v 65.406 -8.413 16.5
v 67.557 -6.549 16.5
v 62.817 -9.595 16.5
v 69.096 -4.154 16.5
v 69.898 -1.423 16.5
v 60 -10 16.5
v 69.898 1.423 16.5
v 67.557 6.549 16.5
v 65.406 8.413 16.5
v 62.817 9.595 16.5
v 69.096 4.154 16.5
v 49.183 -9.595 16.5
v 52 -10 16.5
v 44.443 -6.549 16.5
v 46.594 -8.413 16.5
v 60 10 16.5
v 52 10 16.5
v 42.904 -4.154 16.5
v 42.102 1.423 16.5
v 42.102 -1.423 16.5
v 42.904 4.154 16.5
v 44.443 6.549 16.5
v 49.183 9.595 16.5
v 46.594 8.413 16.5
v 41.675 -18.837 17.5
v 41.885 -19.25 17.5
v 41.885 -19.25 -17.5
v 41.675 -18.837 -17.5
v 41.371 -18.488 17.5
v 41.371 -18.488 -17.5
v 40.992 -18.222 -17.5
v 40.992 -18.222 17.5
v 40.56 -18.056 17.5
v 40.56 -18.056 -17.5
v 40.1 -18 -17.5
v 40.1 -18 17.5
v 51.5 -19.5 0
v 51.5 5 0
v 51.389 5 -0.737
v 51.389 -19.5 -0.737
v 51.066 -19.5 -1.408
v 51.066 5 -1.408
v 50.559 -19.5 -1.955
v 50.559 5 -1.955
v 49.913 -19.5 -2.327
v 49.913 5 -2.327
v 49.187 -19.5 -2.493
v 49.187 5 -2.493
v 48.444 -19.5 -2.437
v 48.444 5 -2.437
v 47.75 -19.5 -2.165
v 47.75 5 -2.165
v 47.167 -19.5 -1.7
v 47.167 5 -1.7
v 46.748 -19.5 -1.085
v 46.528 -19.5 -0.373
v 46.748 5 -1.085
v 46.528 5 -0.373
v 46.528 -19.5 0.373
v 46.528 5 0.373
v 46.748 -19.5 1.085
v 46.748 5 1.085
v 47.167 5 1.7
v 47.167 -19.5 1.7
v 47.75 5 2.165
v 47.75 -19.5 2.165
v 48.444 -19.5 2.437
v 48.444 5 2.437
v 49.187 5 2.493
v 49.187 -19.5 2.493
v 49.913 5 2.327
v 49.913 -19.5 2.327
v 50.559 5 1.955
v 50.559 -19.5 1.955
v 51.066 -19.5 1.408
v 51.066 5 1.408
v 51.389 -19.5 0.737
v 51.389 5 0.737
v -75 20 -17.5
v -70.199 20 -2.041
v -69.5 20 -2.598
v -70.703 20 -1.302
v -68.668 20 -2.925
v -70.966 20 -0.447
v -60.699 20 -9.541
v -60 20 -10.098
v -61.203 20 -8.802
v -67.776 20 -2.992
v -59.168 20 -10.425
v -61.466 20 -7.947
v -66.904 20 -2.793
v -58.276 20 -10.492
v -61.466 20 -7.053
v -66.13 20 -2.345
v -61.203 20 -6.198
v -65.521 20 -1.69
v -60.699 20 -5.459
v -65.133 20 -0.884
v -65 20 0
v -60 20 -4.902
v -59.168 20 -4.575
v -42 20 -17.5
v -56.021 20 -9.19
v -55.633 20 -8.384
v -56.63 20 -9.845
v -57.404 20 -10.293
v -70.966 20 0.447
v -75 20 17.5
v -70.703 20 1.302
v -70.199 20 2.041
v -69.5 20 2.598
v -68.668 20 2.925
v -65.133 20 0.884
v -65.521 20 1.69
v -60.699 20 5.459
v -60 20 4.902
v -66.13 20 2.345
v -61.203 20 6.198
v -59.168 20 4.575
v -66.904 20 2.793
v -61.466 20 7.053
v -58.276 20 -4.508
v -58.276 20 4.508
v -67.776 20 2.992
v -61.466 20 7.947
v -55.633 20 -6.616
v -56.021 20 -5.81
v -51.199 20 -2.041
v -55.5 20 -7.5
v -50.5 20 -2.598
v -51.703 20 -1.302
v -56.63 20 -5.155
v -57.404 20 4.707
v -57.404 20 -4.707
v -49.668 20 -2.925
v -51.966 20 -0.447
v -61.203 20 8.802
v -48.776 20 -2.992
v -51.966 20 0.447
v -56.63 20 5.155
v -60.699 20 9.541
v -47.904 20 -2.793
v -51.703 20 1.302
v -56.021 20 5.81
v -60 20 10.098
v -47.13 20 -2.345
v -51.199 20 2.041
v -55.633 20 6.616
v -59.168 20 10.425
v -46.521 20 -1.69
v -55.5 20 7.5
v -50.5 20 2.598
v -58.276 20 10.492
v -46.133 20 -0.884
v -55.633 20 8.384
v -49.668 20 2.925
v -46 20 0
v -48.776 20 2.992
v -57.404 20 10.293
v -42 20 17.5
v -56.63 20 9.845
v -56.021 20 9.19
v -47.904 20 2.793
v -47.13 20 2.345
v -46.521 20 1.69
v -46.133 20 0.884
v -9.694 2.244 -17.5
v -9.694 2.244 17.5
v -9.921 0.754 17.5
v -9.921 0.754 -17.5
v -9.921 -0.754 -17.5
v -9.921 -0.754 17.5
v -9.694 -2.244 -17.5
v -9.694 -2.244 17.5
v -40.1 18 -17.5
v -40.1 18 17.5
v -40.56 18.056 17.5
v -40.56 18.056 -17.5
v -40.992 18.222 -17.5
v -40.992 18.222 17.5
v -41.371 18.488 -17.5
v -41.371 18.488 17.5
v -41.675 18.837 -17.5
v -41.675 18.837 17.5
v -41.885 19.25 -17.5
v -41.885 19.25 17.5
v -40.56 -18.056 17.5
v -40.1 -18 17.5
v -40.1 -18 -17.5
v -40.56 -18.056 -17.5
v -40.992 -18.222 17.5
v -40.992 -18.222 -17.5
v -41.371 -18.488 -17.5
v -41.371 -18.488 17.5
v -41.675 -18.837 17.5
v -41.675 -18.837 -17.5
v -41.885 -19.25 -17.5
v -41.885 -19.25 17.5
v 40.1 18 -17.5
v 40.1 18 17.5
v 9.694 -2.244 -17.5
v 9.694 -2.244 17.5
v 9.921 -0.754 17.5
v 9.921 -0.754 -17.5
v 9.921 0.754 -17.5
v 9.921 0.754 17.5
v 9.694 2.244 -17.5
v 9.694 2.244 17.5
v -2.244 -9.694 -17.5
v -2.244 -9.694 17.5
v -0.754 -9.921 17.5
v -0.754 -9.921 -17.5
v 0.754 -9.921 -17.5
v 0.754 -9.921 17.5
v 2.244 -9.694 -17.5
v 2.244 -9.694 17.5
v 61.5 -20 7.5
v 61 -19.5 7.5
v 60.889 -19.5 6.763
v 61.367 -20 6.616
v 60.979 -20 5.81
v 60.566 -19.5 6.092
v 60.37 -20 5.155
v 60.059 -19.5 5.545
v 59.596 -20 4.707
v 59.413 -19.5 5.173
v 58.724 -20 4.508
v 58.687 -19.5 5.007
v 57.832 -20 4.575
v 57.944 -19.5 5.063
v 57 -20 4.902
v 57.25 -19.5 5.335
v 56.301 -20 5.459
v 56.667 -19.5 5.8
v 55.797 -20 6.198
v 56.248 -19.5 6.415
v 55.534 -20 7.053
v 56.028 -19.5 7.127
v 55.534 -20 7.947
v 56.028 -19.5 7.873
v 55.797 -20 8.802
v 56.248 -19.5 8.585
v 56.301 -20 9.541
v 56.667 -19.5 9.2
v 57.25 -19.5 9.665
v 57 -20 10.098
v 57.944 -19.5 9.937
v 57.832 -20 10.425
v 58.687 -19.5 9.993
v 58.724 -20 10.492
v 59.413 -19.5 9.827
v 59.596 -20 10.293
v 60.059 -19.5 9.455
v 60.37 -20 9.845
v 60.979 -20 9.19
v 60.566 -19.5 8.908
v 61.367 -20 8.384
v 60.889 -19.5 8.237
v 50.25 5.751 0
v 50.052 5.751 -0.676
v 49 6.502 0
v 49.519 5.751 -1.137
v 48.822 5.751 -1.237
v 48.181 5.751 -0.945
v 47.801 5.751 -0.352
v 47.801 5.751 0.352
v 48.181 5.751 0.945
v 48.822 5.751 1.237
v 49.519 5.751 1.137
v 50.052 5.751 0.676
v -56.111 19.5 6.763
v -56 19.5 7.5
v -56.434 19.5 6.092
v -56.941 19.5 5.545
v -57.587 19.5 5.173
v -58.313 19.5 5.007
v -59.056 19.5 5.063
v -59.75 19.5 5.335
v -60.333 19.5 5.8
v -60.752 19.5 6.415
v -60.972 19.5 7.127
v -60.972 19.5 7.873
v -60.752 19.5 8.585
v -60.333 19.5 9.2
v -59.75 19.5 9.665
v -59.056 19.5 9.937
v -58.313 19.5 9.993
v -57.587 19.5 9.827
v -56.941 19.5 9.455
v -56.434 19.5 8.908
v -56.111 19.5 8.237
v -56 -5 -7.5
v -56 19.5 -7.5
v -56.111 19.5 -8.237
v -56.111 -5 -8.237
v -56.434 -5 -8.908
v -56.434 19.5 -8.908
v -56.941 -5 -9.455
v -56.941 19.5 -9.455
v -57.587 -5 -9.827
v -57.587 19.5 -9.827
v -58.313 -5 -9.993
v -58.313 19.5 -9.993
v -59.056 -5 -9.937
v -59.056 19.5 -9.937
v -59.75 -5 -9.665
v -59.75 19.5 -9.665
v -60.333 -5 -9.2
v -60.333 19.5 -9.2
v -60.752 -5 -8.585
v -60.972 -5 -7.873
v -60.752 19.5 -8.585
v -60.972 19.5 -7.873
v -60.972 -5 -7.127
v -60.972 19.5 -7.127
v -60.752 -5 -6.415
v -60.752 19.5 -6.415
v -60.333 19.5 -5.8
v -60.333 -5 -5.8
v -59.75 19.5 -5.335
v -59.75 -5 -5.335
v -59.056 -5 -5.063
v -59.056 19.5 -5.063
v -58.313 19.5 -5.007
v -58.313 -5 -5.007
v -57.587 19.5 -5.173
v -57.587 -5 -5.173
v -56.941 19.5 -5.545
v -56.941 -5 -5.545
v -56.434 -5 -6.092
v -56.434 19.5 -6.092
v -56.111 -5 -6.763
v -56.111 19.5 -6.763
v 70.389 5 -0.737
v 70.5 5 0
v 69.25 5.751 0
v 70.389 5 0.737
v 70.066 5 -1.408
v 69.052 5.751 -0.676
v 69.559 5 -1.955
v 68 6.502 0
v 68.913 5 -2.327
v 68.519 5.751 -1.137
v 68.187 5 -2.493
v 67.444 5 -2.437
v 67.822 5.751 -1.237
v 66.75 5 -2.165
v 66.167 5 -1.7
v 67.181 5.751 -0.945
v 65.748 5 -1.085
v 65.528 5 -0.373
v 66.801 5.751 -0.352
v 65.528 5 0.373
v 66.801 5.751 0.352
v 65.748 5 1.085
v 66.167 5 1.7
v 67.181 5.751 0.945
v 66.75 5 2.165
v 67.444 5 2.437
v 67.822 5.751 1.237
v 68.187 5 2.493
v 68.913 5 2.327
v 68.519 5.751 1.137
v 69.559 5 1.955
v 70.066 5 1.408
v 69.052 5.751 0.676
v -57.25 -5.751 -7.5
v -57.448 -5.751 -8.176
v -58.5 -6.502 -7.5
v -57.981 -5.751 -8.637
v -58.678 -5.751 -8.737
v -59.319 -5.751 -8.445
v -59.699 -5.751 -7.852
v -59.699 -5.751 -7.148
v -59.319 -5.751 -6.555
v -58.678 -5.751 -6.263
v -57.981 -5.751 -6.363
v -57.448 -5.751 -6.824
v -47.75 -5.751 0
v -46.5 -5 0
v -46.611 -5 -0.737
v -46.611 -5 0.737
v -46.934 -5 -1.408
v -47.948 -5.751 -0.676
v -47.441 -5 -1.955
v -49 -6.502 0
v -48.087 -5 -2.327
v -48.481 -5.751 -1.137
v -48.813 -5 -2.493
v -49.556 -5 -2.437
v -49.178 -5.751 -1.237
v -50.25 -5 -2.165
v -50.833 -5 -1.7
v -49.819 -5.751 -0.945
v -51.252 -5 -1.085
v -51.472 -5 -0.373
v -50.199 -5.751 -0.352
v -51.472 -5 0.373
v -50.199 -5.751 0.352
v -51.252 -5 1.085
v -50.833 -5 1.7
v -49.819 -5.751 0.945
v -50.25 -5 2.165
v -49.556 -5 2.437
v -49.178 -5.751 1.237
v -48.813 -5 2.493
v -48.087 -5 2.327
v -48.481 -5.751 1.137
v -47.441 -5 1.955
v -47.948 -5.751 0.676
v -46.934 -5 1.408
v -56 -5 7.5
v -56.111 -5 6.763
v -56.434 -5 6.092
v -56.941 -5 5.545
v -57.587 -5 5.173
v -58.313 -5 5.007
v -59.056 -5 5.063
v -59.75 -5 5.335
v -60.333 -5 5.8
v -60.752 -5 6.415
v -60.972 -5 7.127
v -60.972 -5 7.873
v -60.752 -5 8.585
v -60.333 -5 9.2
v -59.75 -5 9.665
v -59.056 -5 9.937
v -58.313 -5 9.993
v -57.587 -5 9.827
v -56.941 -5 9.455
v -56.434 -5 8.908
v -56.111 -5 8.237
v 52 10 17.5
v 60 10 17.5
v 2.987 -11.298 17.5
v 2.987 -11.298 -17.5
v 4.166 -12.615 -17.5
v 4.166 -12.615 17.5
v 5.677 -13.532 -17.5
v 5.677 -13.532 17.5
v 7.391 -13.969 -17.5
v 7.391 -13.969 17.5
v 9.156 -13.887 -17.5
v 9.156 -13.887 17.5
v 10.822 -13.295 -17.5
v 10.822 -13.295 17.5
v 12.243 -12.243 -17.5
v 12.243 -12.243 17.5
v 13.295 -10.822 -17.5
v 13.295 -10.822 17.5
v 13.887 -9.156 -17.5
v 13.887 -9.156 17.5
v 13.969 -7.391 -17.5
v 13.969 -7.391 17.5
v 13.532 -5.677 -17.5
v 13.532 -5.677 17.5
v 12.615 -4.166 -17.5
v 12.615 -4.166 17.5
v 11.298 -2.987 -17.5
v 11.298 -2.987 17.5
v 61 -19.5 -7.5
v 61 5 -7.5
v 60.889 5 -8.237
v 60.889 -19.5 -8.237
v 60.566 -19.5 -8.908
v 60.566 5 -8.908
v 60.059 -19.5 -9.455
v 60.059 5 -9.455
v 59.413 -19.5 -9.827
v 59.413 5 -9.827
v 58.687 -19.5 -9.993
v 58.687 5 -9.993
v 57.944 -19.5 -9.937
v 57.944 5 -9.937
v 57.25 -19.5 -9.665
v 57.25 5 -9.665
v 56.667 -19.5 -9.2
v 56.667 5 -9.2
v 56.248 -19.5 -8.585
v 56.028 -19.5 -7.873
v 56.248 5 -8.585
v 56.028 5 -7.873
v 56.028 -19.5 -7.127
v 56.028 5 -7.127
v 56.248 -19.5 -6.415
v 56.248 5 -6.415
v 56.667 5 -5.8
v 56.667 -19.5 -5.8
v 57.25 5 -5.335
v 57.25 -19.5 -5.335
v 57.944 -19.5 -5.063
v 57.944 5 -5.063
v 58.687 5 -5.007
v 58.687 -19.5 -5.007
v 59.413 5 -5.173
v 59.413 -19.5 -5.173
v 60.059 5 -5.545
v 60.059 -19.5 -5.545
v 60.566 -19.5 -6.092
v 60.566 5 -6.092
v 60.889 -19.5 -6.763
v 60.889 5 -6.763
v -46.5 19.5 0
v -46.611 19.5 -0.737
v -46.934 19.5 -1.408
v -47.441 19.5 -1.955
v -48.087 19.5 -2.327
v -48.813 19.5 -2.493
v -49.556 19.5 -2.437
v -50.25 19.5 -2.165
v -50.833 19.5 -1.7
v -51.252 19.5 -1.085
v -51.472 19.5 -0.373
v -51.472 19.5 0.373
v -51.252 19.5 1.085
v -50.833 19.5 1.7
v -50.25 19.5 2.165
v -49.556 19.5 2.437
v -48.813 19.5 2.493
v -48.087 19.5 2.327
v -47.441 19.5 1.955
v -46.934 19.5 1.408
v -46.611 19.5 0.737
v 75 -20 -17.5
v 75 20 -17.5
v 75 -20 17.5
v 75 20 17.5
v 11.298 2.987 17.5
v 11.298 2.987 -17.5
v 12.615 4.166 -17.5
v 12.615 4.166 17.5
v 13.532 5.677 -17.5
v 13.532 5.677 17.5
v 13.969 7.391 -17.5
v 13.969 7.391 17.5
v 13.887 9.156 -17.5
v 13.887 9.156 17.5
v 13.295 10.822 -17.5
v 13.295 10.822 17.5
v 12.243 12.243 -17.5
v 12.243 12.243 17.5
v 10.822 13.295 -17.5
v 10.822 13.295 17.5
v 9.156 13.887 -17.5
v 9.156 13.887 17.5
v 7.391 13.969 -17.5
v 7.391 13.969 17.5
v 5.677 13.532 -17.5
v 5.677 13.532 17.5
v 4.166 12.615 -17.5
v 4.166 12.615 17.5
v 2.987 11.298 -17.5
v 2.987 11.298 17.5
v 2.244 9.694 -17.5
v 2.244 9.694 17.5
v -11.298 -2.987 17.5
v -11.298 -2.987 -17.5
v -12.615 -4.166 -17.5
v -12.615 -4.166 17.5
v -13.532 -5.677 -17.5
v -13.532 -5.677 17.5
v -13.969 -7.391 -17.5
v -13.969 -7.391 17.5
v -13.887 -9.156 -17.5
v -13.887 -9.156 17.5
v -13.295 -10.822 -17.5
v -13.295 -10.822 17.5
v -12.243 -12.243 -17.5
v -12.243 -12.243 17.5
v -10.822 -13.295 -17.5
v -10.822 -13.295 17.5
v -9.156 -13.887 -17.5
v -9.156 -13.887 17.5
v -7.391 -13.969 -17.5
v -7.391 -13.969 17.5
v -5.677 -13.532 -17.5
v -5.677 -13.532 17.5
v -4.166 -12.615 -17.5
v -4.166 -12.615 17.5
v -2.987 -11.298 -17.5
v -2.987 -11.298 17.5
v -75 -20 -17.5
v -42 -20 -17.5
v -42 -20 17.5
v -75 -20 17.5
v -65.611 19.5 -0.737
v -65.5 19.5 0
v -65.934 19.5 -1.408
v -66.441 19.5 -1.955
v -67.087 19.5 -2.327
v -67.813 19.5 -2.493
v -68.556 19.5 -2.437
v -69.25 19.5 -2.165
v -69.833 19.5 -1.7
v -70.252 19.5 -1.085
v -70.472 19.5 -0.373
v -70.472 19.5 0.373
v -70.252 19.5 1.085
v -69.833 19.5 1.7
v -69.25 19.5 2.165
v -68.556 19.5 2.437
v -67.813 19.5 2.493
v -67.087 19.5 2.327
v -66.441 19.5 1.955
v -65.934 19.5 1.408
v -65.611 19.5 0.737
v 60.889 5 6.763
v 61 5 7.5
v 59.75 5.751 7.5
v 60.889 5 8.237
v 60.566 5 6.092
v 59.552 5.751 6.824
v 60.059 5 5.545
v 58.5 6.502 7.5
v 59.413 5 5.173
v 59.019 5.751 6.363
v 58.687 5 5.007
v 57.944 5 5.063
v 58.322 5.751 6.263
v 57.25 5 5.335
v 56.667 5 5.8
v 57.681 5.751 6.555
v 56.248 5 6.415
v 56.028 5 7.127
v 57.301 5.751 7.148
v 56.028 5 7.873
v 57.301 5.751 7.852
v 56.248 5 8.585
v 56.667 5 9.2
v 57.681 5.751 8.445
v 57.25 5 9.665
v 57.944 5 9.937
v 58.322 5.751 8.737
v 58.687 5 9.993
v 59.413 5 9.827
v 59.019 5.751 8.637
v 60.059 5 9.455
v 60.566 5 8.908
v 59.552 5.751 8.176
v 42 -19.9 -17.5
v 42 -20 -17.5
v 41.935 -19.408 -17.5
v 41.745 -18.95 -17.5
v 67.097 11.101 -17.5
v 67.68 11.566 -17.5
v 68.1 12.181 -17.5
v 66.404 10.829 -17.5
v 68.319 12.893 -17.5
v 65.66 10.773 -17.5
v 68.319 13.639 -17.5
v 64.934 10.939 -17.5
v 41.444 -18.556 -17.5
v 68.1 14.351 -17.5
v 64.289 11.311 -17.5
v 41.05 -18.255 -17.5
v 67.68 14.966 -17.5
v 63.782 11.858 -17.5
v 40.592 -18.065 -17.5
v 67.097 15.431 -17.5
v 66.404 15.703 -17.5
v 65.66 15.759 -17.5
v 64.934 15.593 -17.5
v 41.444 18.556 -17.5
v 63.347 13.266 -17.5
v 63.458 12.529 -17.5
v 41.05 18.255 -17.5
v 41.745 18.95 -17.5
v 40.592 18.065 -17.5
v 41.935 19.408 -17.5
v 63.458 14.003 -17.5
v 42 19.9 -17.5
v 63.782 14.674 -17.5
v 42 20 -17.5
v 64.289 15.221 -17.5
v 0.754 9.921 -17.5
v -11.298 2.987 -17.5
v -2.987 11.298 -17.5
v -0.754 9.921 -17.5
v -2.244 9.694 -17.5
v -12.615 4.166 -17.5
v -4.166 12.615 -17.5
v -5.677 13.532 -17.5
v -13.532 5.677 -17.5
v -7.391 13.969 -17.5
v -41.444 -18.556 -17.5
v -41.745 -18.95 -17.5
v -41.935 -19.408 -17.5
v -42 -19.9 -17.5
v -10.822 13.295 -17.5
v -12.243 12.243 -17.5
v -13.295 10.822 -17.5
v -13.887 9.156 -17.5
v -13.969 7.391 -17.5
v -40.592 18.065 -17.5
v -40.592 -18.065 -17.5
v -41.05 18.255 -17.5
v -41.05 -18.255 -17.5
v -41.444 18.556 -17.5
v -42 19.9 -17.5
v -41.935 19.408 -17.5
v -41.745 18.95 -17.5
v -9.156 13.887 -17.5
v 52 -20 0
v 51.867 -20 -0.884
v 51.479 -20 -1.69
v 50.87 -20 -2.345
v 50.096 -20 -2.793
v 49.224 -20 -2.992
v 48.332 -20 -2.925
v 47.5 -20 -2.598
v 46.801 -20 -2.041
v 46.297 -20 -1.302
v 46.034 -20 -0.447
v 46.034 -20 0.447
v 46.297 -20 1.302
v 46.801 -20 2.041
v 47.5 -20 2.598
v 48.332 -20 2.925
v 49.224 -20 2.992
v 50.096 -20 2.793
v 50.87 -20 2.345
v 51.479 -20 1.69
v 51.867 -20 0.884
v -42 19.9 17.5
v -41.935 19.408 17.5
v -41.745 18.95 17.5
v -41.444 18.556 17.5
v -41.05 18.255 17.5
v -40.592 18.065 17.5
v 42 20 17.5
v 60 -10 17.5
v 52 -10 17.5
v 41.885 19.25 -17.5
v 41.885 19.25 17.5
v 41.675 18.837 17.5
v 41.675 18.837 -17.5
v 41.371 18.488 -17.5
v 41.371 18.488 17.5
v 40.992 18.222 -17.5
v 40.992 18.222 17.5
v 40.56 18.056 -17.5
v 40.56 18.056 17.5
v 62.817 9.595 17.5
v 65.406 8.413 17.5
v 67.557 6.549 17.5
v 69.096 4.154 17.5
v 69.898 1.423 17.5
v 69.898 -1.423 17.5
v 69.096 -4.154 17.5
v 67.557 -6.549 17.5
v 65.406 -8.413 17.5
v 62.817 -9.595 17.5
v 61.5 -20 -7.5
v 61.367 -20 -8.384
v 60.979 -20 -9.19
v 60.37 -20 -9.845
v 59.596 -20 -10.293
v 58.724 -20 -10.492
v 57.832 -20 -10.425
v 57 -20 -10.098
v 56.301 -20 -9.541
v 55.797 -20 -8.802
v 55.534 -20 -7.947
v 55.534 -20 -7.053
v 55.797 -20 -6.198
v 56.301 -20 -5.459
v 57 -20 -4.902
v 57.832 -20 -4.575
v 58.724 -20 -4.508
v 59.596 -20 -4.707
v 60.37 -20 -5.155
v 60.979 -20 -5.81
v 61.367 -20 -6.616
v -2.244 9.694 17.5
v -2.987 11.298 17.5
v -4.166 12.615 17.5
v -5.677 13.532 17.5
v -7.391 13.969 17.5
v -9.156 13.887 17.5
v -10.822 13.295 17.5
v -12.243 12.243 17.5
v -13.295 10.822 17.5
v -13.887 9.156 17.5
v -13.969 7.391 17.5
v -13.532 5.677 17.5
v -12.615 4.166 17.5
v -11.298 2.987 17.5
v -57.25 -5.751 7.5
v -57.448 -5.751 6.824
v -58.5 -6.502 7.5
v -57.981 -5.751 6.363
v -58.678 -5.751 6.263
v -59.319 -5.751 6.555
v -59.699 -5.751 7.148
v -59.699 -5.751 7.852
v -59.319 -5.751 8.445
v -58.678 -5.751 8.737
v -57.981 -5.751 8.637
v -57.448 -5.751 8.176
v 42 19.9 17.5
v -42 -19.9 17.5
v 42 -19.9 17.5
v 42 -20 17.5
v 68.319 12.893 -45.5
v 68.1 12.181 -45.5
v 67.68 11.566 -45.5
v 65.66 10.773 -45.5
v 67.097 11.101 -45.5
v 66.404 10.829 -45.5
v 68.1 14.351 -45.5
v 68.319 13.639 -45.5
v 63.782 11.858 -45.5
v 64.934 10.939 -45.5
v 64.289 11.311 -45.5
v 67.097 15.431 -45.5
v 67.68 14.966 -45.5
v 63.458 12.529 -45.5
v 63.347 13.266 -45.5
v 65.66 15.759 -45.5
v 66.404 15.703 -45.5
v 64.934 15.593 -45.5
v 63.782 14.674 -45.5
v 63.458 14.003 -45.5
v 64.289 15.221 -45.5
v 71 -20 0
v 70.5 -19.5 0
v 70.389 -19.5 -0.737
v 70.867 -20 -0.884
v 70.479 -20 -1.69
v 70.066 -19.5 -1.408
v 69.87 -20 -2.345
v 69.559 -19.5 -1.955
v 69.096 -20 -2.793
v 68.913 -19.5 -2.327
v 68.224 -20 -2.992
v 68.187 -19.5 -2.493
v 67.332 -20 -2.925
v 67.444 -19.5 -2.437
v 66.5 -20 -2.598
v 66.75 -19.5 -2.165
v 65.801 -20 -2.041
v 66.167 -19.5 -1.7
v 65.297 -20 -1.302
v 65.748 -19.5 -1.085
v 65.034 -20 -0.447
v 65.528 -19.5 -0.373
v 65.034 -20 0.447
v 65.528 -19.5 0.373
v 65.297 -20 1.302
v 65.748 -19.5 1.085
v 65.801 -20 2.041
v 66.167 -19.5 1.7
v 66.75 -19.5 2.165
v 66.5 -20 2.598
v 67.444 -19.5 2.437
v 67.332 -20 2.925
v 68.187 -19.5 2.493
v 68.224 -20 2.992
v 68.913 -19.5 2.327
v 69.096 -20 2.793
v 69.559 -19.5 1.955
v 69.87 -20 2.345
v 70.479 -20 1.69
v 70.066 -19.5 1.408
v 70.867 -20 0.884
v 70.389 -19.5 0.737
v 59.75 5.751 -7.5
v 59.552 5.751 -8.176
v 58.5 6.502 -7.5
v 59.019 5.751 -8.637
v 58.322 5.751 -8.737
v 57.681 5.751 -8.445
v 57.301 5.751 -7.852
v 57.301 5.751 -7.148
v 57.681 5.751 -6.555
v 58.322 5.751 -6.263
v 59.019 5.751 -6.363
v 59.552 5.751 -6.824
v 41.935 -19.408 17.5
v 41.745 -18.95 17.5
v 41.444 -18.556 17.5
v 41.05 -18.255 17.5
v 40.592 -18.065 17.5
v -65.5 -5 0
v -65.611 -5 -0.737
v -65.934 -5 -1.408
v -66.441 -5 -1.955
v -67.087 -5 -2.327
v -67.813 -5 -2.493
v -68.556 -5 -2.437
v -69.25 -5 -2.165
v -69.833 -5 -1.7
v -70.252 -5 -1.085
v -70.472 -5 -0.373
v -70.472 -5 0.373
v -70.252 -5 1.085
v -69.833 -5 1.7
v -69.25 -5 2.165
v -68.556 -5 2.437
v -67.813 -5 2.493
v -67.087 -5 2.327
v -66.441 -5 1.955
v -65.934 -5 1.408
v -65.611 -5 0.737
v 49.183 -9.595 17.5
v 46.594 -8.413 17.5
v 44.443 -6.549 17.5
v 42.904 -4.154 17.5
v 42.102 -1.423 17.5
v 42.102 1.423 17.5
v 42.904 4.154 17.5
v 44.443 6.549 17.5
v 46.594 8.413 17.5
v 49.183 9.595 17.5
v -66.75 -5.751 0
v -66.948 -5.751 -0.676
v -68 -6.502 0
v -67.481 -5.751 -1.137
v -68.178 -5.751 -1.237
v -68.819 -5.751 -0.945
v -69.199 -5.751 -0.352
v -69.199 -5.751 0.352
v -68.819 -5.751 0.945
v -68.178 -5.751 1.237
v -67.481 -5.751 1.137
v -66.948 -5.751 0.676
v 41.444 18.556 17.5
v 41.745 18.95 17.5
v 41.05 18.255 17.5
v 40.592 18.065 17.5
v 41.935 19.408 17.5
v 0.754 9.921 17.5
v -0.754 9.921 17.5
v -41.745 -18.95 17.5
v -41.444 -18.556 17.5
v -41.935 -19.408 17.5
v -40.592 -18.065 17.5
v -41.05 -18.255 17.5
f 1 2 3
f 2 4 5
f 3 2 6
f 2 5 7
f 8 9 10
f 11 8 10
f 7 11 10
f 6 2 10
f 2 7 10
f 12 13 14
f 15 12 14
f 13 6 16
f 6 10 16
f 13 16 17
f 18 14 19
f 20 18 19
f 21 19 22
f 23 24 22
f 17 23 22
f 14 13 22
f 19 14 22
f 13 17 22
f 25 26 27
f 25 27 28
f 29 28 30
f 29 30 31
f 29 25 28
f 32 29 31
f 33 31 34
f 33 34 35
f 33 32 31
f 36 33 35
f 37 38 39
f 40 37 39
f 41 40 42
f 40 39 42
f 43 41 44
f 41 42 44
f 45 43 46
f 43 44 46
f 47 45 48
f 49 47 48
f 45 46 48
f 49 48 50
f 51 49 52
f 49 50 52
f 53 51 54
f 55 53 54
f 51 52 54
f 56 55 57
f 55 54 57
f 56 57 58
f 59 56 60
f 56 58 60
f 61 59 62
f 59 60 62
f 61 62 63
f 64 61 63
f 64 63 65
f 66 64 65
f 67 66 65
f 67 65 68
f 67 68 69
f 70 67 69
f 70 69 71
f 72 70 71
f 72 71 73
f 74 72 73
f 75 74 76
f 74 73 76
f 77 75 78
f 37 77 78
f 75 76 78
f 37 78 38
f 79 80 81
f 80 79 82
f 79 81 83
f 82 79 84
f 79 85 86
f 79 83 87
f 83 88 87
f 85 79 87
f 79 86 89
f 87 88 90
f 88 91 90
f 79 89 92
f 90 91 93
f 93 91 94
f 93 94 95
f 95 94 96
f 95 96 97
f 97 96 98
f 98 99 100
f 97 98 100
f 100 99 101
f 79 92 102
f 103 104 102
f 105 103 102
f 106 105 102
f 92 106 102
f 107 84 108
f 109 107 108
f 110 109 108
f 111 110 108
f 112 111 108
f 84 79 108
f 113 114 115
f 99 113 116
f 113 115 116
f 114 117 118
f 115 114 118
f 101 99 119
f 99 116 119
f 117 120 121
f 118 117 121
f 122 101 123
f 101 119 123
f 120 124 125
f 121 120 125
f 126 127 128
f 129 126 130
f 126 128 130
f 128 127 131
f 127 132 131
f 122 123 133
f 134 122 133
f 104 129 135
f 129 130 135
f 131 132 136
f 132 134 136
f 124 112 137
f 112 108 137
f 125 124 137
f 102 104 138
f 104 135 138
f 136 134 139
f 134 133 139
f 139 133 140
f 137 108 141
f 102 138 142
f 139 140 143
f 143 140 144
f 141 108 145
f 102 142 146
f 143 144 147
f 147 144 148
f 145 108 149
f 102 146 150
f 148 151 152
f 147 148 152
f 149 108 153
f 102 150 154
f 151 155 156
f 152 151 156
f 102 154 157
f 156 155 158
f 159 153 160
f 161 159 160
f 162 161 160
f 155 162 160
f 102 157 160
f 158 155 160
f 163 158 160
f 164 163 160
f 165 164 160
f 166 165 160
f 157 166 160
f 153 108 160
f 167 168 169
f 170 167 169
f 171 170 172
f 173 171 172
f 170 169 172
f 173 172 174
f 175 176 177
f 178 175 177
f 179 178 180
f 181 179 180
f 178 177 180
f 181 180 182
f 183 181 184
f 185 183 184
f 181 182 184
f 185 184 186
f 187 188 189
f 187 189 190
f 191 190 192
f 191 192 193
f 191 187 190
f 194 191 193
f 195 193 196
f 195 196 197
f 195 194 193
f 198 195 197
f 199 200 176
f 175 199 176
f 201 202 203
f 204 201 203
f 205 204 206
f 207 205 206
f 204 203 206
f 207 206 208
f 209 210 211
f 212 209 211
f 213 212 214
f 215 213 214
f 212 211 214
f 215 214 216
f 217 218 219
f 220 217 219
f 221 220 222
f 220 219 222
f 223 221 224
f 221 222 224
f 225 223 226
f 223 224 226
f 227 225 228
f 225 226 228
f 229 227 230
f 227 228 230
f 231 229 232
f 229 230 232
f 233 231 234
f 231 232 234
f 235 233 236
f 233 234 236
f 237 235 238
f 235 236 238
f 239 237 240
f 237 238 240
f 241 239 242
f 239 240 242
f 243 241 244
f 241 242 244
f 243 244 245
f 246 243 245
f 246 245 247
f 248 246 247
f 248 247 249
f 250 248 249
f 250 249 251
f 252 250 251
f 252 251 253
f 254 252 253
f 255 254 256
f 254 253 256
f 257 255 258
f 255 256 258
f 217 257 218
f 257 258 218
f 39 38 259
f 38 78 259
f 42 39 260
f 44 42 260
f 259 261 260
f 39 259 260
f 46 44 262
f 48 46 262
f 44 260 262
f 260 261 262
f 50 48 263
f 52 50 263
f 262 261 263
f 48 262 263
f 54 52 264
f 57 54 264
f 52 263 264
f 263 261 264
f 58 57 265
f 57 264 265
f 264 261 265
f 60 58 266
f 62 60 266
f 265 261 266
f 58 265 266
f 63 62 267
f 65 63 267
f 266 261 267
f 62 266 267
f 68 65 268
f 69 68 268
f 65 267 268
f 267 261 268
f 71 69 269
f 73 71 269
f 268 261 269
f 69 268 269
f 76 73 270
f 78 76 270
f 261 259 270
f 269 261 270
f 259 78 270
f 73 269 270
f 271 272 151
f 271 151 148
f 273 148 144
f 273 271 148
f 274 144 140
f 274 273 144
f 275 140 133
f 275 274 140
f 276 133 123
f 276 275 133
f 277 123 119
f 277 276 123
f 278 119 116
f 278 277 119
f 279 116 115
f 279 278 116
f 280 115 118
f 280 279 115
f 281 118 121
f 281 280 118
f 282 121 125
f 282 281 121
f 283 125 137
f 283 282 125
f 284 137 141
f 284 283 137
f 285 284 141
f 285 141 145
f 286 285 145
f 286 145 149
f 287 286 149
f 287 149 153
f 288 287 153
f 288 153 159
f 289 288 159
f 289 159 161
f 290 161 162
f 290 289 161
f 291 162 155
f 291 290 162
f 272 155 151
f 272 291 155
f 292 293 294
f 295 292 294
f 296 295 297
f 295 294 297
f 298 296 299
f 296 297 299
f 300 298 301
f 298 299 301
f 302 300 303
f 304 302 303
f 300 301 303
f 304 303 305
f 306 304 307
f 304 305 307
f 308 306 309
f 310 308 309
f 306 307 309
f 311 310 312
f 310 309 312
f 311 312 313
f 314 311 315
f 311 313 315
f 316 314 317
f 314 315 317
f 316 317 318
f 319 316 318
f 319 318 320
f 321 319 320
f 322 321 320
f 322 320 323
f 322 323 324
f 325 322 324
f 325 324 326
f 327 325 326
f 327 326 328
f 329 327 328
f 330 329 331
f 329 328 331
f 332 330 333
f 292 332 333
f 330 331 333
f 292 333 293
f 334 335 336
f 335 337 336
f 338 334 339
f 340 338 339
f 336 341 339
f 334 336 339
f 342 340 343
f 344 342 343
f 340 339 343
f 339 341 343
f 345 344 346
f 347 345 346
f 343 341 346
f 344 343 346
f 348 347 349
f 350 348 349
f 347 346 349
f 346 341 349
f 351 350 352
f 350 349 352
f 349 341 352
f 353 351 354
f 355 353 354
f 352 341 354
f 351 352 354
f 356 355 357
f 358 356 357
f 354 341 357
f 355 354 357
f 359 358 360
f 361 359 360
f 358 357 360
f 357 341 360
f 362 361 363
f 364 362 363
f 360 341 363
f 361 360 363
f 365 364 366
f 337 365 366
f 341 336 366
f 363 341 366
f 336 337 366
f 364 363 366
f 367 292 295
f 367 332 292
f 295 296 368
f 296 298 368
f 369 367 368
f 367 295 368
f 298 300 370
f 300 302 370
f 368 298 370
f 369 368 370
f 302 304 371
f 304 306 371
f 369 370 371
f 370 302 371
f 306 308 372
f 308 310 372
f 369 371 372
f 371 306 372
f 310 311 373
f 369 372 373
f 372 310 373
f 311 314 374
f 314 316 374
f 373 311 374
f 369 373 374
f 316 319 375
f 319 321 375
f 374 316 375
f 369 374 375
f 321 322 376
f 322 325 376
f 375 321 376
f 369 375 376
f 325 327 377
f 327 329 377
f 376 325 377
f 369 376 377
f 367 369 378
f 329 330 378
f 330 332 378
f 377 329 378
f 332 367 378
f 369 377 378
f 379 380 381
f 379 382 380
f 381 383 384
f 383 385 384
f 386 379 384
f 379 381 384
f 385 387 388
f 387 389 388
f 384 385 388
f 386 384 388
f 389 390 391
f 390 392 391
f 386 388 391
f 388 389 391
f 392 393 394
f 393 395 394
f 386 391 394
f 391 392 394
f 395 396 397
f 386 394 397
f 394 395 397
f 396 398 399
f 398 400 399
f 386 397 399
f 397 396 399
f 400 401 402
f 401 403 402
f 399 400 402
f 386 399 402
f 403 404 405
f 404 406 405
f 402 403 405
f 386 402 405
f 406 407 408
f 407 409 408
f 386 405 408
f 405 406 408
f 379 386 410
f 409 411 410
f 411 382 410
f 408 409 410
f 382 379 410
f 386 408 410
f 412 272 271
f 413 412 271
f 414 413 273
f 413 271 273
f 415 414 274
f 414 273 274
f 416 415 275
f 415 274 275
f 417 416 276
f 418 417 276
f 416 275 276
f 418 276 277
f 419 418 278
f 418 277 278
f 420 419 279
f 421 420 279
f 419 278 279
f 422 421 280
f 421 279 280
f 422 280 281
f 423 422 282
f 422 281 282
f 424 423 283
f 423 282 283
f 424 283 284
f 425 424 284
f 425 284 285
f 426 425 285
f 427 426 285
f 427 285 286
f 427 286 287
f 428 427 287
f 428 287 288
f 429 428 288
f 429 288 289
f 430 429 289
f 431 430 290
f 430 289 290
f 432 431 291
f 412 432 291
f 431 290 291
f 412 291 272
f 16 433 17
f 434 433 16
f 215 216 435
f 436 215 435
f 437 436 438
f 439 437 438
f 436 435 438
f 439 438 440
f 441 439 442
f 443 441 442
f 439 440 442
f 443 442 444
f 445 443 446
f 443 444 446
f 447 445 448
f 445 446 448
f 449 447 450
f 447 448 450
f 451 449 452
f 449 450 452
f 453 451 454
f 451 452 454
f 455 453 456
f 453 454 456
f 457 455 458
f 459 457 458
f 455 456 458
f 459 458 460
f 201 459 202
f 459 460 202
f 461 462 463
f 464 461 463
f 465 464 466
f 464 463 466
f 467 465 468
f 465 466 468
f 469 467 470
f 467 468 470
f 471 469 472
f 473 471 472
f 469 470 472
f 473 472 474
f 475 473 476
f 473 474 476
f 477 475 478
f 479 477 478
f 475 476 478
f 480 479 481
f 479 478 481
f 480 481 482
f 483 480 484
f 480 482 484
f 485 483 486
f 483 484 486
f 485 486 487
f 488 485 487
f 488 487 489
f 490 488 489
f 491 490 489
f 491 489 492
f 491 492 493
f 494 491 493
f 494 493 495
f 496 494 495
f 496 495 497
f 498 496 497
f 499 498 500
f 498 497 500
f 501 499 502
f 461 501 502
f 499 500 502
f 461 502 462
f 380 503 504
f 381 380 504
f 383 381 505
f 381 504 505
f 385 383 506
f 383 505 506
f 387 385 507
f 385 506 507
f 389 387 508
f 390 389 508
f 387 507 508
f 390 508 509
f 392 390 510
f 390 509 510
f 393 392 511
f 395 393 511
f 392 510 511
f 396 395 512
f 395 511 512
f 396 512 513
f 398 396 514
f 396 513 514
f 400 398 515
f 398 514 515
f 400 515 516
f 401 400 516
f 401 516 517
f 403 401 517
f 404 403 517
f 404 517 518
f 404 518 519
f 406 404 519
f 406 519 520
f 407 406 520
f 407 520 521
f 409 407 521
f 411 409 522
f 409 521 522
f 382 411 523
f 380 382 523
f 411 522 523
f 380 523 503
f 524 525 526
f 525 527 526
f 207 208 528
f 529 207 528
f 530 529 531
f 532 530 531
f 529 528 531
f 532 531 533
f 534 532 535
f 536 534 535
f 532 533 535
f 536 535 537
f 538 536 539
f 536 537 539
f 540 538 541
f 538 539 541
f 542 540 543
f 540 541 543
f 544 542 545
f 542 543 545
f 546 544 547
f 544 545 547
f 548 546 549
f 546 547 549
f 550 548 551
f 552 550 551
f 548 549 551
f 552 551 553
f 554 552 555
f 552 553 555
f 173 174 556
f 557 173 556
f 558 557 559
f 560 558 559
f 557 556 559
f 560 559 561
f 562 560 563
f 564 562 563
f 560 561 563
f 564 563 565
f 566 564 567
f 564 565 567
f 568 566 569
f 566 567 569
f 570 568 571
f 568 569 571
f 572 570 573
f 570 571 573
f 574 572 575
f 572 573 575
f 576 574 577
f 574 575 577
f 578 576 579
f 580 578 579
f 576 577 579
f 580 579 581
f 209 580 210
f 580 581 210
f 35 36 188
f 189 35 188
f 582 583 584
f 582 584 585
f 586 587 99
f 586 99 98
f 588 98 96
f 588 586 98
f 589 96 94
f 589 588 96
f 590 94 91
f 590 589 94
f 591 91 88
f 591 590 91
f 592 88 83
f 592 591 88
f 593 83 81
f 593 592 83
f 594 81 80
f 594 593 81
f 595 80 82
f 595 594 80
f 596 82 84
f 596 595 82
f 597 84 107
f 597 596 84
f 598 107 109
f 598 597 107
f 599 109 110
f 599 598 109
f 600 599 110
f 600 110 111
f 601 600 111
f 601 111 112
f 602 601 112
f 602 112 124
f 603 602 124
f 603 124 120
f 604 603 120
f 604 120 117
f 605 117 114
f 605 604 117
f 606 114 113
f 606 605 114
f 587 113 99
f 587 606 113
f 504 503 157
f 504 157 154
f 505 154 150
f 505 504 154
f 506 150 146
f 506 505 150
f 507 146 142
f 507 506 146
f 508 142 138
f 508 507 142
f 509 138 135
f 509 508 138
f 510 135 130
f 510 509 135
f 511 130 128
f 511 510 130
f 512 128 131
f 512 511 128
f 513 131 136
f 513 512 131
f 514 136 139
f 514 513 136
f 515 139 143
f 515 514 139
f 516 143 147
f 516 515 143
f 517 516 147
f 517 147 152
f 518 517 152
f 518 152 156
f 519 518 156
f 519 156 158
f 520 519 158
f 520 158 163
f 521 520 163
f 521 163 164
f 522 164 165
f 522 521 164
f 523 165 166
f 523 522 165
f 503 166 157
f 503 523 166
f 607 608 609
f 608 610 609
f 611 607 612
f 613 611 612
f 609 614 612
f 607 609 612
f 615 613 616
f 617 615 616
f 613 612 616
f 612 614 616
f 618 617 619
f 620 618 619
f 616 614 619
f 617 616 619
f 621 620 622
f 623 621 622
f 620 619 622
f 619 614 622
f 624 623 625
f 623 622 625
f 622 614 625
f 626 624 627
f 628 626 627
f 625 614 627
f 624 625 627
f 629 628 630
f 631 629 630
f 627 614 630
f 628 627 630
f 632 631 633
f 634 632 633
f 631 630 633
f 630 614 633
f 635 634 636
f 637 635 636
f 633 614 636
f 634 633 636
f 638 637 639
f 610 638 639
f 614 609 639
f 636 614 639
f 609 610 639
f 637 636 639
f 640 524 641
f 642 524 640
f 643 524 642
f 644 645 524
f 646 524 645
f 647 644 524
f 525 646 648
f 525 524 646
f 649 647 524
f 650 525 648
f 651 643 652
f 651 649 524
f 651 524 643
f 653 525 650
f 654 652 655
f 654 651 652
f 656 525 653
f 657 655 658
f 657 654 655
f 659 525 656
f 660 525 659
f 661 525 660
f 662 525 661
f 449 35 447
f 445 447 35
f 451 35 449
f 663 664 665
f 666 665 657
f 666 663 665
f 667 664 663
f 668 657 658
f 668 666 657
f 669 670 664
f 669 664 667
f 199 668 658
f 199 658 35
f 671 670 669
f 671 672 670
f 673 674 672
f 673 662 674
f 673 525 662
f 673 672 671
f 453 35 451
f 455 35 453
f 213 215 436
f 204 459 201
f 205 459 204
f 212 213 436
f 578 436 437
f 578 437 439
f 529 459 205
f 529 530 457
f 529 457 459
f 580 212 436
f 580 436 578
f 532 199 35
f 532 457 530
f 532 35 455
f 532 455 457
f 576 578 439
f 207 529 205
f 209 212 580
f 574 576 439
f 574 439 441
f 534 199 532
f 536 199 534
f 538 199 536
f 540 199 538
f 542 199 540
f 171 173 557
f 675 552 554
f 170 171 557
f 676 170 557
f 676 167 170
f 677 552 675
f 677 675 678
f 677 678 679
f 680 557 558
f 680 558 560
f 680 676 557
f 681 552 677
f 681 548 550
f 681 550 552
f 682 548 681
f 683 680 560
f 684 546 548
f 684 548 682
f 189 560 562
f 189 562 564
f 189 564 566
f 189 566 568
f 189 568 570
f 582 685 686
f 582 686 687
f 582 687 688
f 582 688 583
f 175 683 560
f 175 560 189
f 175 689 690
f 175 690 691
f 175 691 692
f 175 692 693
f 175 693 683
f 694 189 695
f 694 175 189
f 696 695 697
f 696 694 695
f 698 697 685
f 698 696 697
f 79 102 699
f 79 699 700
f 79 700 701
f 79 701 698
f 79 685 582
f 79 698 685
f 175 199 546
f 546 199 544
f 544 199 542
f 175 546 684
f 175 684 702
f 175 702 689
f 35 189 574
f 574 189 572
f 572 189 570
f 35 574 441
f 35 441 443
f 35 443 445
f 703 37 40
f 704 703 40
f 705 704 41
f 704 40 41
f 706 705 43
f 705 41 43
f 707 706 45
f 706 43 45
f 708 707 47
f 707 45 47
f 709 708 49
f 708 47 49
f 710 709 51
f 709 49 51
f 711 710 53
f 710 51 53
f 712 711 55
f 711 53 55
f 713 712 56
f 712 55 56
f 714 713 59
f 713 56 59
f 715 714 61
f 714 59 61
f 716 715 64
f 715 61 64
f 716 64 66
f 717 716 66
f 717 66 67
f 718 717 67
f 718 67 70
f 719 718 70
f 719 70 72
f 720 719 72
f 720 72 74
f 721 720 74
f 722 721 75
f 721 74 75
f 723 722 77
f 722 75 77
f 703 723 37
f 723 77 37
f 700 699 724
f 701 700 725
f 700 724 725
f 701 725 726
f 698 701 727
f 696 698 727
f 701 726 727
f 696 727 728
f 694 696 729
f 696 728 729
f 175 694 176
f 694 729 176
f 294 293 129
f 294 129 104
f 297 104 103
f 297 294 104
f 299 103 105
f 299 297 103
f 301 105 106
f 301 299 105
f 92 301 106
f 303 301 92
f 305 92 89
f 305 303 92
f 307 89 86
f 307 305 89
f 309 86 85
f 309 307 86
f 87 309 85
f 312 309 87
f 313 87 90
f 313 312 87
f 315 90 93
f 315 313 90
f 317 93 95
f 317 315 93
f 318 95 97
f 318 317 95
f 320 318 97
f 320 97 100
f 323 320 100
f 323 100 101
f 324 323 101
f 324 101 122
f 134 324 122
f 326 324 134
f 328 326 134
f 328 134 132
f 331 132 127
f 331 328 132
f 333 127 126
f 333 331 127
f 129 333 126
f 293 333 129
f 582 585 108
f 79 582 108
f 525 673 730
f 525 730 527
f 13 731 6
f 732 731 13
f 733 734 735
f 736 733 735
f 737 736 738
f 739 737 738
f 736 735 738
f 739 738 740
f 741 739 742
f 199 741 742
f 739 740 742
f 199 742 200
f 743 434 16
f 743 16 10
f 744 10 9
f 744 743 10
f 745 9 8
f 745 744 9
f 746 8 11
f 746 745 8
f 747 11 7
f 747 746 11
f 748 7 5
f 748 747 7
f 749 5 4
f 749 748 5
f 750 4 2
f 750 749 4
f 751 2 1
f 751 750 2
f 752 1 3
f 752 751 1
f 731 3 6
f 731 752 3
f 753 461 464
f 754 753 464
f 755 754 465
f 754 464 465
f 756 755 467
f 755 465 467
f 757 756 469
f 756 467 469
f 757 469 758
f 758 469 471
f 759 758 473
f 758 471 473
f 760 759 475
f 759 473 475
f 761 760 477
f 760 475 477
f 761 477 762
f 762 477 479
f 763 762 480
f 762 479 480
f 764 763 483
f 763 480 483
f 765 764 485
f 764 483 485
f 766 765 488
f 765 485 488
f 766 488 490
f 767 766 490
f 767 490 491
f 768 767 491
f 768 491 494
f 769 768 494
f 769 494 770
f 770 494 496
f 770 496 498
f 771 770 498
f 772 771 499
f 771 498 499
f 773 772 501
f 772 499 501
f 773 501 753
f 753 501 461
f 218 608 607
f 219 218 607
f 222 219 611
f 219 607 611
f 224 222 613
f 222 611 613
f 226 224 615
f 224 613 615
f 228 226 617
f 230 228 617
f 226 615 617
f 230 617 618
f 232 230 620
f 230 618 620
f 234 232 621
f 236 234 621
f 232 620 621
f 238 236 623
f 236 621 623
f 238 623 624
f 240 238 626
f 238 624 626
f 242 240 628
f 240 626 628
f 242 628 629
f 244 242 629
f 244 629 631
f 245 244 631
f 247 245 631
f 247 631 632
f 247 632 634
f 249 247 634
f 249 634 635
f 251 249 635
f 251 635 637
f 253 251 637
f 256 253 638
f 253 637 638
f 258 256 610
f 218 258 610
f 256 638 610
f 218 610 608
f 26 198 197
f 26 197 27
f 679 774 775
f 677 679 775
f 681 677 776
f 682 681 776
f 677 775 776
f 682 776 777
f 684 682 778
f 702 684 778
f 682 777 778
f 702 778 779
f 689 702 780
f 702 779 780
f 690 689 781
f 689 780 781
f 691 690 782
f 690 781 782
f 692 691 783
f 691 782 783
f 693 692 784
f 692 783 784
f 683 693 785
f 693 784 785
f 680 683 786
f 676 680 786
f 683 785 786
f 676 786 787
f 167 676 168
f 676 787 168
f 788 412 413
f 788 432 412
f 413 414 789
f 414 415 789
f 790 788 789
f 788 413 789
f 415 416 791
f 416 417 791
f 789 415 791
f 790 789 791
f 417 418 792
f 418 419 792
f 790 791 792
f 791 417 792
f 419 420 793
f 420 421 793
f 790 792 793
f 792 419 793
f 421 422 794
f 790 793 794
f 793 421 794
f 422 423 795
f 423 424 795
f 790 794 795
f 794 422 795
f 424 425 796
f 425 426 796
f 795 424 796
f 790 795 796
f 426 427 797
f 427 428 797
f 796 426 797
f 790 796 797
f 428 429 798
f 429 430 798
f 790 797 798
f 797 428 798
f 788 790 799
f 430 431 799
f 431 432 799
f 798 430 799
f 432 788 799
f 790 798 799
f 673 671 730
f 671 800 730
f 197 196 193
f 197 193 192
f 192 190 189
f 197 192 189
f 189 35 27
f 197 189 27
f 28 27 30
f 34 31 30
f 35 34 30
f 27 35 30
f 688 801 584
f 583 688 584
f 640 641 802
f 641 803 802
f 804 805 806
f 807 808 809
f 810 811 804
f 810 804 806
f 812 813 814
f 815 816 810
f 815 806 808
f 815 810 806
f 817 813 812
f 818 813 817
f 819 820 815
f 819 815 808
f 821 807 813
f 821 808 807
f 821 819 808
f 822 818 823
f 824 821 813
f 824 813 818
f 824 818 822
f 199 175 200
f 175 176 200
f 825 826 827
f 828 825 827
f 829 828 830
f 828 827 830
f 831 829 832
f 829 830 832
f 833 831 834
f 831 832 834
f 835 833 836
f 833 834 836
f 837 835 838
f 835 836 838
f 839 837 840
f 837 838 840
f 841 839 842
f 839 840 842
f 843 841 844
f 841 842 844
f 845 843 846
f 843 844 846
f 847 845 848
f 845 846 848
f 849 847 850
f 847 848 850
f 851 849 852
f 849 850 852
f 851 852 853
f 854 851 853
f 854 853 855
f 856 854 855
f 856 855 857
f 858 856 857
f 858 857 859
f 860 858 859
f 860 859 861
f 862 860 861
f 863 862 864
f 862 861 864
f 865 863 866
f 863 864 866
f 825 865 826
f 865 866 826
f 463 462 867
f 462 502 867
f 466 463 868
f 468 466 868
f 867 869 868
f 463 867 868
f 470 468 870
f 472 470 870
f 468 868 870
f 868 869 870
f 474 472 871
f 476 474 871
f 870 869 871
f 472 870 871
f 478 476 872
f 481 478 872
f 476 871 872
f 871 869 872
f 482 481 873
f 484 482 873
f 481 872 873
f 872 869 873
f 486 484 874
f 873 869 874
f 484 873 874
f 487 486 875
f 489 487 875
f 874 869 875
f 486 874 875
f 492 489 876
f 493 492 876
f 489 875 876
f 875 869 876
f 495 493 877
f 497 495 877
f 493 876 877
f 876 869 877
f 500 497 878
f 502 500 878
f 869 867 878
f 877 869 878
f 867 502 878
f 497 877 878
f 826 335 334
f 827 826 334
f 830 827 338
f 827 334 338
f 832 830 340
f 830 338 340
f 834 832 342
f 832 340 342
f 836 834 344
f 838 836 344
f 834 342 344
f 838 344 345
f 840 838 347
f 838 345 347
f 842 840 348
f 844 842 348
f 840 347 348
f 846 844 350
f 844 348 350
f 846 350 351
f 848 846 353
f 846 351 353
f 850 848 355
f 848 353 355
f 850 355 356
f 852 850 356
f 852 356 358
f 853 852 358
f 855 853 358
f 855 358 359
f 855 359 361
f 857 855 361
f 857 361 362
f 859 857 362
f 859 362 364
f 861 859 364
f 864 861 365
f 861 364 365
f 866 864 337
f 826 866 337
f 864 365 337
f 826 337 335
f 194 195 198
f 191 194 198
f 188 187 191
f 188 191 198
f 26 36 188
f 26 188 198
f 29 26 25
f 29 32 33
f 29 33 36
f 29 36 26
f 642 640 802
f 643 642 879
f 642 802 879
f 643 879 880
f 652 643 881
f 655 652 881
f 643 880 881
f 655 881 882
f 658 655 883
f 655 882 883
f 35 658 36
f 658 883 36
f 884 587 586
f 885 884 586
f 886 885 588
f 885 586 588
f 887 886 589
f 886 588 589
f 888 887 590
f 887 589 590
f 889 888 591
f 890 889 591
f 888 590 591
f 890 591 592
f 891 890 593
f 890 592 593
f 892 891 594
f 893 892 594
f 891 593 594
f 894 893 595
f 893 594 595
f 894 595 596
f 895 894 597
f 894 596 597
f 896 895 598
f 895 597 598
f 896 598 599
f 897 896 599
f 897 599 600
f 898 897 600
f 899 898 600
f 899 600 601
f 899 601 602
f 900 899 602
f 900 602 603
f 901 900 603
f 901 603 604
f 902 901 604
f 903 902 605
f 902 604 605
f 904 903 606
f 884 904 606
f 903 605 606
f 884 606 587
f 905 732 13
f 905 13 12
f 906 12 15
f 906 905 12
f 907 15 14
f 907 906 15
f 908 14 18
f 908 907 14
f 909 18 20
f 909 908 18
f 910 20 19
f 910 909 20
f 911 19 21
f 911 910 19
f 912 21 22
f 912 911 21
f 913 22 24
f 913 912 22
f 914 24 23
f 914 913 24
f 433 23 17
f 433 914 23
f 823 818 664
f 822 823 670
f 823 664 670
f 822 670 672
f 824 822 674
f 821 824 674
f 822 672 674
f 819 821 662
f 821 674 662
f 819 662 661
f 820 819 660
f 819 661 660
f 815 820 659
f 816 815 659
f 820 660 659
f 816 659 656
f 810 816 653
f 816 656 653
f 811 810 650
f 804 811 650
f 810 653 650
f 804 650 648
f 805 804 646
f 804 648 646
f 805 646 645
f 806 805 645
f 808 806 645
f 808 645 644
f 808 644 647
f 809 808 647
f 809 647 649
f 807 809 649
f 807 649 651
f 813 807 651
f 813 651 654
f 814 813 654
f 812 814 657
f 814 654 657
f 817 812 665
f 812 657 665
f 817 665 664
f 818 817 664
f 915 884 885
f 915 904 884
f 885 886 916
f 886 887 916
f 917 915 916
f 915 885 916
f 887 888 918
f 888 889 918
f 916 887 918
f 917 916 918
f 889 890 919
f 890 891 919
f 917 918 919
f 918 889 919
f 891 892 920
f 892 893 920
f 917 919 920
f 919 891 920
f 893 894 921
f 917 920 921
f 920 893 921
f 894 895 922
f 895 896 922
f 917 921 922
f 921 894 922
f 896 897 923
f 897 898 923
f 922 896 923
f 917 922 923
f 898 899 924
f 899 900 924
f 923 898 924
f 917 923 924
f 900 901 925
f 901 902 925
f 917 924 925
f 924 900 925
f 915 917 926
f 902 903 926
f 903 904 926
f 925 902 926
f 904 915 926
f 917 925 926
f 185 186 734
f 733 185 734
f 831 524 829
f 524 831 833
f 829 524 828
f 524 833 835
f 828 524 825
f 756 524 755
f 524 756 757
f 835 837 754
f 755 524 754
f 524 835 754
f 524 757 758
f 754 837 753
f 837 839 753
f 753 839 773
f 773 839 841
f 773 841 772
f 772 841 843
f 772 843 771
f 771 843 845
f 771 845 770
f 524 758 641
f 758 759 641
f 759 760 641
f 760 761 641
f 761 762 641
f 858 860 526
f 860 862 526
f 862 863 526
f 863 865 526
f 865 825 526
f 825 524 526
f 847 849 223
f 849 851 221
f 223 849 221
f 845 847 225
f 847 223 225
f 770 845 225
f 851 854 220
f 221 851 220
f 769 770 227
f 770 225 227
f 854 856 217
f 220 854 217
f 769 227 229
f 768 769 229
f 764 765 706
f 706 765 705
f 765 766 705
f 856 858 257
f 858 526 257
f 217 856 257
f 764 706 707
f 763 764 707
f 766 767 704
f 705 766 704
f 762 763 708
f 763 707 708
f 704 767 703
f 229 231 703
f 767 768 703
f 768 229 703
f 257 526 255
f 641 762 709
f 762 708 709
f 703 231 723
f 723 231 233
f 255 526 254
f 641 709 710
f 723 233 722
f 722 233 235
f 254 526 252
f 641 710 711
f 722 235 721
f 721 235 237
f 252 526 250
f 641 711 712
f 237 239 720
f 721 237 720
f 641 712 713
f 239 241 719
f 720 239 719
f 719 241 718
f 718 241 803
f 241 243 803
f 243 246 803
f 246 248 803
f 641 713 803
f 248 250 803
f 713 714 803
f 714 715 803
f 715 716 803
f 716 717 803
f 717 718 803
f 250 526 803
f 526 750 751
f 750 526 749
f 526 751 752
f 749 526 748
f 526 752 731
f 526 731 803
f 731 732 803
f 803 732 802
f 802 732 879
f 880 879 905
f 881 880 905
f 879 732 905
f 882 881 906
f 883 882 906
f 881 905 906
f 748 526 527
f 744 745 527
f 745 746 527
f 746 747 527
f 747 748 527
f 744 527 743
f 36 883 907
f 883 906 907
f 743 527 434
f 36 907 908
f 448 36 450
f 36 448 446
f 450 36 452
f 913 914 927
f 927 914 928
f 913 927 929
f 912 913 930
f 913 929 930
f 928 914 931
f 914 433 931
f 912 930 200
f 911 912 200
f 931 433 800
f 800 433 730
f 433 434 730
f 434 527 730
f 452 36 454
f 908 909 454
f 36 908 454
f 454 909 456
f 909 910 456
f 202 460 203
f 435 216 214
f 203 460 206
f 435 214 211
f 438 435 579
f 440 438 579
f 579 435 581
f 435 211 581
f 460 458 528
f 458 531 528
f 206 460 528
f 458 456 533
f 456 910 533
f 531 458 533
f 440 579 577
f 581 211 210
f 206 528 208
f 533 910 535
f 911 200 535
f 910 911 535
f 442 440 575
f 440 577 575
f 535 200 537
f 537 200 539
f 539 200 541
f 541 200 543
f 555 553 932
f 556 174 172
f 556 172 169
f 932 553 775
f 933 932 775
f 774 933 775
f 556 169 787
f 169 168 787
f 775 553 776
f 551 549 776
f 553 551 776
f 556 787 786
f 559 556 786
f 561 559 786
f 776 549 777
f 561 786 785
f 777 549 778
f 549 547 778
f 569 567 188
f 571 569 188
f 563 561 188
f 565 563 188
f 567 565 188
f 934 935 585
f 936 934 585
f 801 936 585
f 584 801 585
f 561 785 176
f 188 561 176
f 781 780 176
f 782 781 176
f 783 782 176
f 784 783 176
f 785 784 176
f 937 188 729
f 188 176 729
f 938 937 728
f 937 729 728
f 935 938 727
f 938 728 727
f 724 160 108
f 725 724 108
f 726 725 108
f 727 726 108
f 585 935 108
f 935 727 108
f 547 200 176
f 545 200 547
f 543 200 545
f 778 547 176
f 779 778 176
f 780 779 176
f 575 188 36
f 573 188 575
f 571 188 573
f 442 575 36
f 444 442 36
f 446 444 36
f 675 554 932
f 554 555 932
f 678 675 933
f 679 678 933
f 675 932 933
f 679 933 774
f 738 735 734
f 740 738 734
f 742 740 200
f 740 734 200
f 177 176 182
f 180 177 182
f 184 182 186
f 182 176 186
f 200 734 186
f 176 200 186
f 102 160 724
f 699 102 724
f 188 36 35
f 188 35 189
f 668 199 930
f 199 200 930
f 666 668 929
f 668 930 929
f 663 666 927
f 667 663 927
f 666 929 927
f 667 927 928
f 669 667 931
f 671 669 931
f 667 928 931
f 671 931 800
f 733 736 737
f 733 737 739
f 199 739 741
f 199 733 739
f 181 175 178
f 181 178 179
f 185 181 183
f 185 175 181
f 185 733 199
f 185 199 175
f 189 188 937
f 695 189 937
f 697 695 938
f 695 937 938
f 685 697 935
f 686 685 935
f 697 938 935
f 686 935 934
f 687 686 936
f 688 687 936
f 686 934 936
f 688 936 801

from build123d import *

# Parameters (mm, degrees)
EXTRUDE_1_DEPTH     = 17.5
EXTRUDE_2_DEPTH     = 35
EXTRUDE_2_2_DEPTH   = 35
CUT_EXTRUDE_1_DEPTH = 1
CHAMFER_2_SIZE      = 0.5
SKETCH1_R           = 2.5
BOSS_EXTRUDE1_DEPTH = 28


# Read off the part's stored shape, not the designer's step: M6 螺纹孔2
with BuildPart() as part:
    # 草图1 → 凸台-拉伸1 (new, symmetric)
    with BuildSketch(Plane.XY):
        with BuildLine():
            Line((-42, 20), (-42, 19.9))
            ThreePointArc((-42, 19.9), (-41.443502884, 18.556497116), (-40.1, 18))
            Line((-40.1, 18), (40.1, 18))
            ThreePointArc((40.1, 18), (41.443502884, 18.556497116), (42, 19.9))
            Line((42, 19.9), (42, 20))
            Line((42, 20), (75, 20))
            Line((75, 20), (75, -20))
            Line((75, -20), (42, -20))
            Line((42, -20), (42, -19.9))
            ThreePointArc((42, -19.9), (41.443502884, -18.556497116), (40.1, -18))
            Line((40.1, -18), (-40.1, -18))
            ThreePointArc((-40.1, -18), (-41.443502884, -18.556497116), (-42, -19.9))
            Line((-42, -19.9), (-42, -20))
            Line((-42, -20), (-75, -20))
            Line((-75, -20), (-75, 20))
            Line((-75, 20), (-42, 20))
        make_face()
        with BuildLine():
            ThreePointArc((2.244000503, 9.693655747), (0, 9.95), (-2.244000503, 9.693655747))
            ThreePointArc((-2.244000503, 9.693655747), (-12.242640687, 12.242640687), (-9.693655747, 2.244000503))
            ThreePointArc((-9.693655747, 2.244000503), (-9.95, 0), (-9.693655747, -2.244000503))
            ThreePointArc((-9.693655747, -2.244000503), (-12.242640687, -12.242640687), (-2.244000503, -9.693655747))
            ThreePointArc((-2.244000503, -9.693655747), (0, -9.95), (2.244000503, -9.693655747))
            ThreePointArc((2.244000503, -9.693655747), (12.242640687, -12.242640687), (9.693655747, -2.244000503))
            ThreePointArc((9.693655747, -2.244000503), (9.95, 0), (9.693655747, 2.244000503))
            ThreePointArc((9.693655747, 2.244000503), (12.242640687, 12.242640687), (2.244000503, 9.693655747))
        make_face(mode=Mode.SUBTRACT)
    extrude(amount=EXTRUDE_1_DEPTH, both=True)

    # 草图3 → 切除-拉伸1 (cut)
    with BuildSketch(Plane.XY.offset(17.5)):
        with BuildLine():
            Line((52, 10), (60, 10))
            ThreePointArc((60, 10), (70, 0), (60, -10))
            Line((60, -10), (52, -10))
            ThreePointArc((52, -10), (42, 0), (52, 10))
        make_face()
    extrude(amount=-CUT_EXTRUDE_1_DEPTH, mode=Mode.SUBTRACT)

    # M6 螺纹孔2 outline → M6 螺纹孔2 (revolve, cut)
    with BuildSketch(Plane(origin=(-58.5, 0, 7.5), x_dir=(1, 0, 0), z_dir=(0, 0, 1))):
        Polygon((0, 20), (0, -6.502151548), (2.5, -5), (2.5, 20), align=None)
    revolve(axis=Axis((-58.5, 0, 7.5), (0, 1, 0)), mode=Mode.SUBTRACT)

    # Hole Wizard M6 _2 2 outline → Hole Wizard M6 _2 2 (revolve, cut)
    with BuildSketch(Plane(origin=(-68, 0, 0), x_dir=(1, 0, 0), z_dir=(0, 0, 1))):
        Polygon((0, 20), (0, -6.502151548), (2.5, -5), (2.5, 20), align=None)
    revolve(axis=Axis((-68, 0, 0), (0, 1, 0)), mode=Mode.SUBTRACT)

    # Hole Wizard M6 _2 3 outline → Hole Wizard M6 _2 3 (revolve, cut)
    with BuildSketch(Plane(origin=(-58.5, 0, -7.5), x_dir=(1, 0, 0), z_dir=(0, 0, 1))):
        Polygon((0, 20), (0, -6.502151548), (2.5, -5), (2.5, 20), align=None)
    revolve(axis=Axis((-58.5, 0, -7.5), (0, 1, 0)), mode=Mode.SUBTRACT)

    # Hole Wizard M6 _2 4 outline → Hole Wizard M6 _2 4 (revolve, cut)
    with BuildSketch(Plane(origin=(-49, 0, 0), x_dir=(1, 0, 0), z_dir=(0, 0, 1))):
        Polygon((0, 20), (0, -6.502151548), (2.5, -5), (2.5, 20), align=None)
    revolve(axis=Axis((-49, 0, 0), (0, 1, 0)), mode=Mode.SUBTRACT)

    # Hole Wizard M6 _2 5 outline → Hole Wizard M6 _2 5 (revolve, cut)
    with BuildSketch(Plane(origin=(68, 0, 0), x_dir=(1, 0, 0), z_dir=(0, 0, 1))):
        Polygon((2.5, 5), (0, 6.502151548), (0, -20), (2.5, -20), align=None)
    revolve(axis=Axis((68, 0, 0), (0, 1, 0)), mode=Mode.SUBTRACT)

    # Hole Wizard M6 _2 6 outline → Hole Wizard M6 _2 6 (revolve, cut)
    with BuildSketch(Plane(origin=(58.5, 0, 7.5), x_dir=(1, 0, 0), z_dir=(0, 0, 1))):
        Polygon((2.5, 5), (0, 6.502151548), (0, -20), (2.5, -20), align=None)
    revolve(axis=Axis((58.5, 0, 7.5), (0, 1, 0)), mode=Mode.SUBTRACT)

    # Hole Wizard M6 _2 7 outline → Hole Wizard M6 _2 7 (revolve, cut)
    with BuildSketch(Plane(origin=(58.5, 0, -7.5), x_dir=(1, 0, 0), z_dir=(0, 0, 1))):
        Polygon((2.5, 5), (0, 6.502151548), (0, -20), (2.5, -20), align=None)
    revolve(axis=Axis((58.5, 0, -7.5), (0, 1, 0)), mode=Mode.SUBTRACT)

    # Hole Wizard M6 _2 8 outline → Hole Wizard M6 _2 8 (revolve, cut)
    with BuildSketch(Plane(origin=(49, 0, 0), x_dir=(1, 0, 0), z_dir=(0, 0, 1))):
        Polygon((2.5, 5), (0, 6.502151548), (0, -20), (2.5, -20), align=None)
    revolve(axis=Axis((49, 0, 0), (0, 1, 0)), mode=Mode.SUBTRACT)

    # 倒角2
    chamfer_2_edges = [part.edges().sort_by_distance(p)[0] for p in [
        (65.5, -20, 0),
        (56, -20, 7.5),
        (56, -20, -7.5),
        (46.5, -20, 0),
        (-61, 20, 7.5),
        (-70.5, 20, 0),
        (-61, 20, -7.5),
        (-51.5, 20, 0),
    ]]
    chamfer(chamfer_2_edges, length=CHAMFER_2_SIZE)

    # Sketch1 → Boss-Extrude1 (add)
    with BuildSketch(Plane(origin=(0, 0, -17.5), x_dir=(-1, 0, 0), z_dir=(0, 0, -1))):
        with Locations((-65.847321135, 13.266006363)):
            Circle(SKETCH1_R)
    extrude(amount=BOSS_EXTRUDE1_DEPTH)


with BuildPart() as body_2:
    # 草图2 → 凸台-拉伸2 (new body)
    with BuildSketch(Plane.XY.offset(17.5)):
        with BuildLine():
            Line((-41.885357107, 19.25), (41.885357107, 19.25))
            ThreePointArc((41.885357107, 19.25), (41.189724736, 18.343561758), (40.1, 18))
            Line((40.1, 18), (-40.1, 18))
            ThreePointArc((-40.1, 18), (-41.189724736, 18.343561758), (-41.885357107, 19.25))
        make_face()
    extrude(amount=-EXTRUDE_2_DEPTH)


with BuildPart() as body_3:
    # 草图2 → Extrude 2 2 (new body)
    with BuildSketch(Plane.XY.offset(17.5)):
        with BuildLine():
            Line((-41.885357107, -19.25), (41.885357107, -19.25))
            ThreePointArc((41.885357107, -19.25), (41.189724736, -18.343561758), (40.1, -18))
            Line((40.1, -18), (-40.1, -18))
            ThreePointArc((-40.1, -18), (-41.189724736, -18.343561758), (-41.885357107, -19.25))
        make_face()
    extrude(amount=-EXTRUDE_2_2_DEPTH)


solid = Compound([part.part, body_2.part, body_3.part])
